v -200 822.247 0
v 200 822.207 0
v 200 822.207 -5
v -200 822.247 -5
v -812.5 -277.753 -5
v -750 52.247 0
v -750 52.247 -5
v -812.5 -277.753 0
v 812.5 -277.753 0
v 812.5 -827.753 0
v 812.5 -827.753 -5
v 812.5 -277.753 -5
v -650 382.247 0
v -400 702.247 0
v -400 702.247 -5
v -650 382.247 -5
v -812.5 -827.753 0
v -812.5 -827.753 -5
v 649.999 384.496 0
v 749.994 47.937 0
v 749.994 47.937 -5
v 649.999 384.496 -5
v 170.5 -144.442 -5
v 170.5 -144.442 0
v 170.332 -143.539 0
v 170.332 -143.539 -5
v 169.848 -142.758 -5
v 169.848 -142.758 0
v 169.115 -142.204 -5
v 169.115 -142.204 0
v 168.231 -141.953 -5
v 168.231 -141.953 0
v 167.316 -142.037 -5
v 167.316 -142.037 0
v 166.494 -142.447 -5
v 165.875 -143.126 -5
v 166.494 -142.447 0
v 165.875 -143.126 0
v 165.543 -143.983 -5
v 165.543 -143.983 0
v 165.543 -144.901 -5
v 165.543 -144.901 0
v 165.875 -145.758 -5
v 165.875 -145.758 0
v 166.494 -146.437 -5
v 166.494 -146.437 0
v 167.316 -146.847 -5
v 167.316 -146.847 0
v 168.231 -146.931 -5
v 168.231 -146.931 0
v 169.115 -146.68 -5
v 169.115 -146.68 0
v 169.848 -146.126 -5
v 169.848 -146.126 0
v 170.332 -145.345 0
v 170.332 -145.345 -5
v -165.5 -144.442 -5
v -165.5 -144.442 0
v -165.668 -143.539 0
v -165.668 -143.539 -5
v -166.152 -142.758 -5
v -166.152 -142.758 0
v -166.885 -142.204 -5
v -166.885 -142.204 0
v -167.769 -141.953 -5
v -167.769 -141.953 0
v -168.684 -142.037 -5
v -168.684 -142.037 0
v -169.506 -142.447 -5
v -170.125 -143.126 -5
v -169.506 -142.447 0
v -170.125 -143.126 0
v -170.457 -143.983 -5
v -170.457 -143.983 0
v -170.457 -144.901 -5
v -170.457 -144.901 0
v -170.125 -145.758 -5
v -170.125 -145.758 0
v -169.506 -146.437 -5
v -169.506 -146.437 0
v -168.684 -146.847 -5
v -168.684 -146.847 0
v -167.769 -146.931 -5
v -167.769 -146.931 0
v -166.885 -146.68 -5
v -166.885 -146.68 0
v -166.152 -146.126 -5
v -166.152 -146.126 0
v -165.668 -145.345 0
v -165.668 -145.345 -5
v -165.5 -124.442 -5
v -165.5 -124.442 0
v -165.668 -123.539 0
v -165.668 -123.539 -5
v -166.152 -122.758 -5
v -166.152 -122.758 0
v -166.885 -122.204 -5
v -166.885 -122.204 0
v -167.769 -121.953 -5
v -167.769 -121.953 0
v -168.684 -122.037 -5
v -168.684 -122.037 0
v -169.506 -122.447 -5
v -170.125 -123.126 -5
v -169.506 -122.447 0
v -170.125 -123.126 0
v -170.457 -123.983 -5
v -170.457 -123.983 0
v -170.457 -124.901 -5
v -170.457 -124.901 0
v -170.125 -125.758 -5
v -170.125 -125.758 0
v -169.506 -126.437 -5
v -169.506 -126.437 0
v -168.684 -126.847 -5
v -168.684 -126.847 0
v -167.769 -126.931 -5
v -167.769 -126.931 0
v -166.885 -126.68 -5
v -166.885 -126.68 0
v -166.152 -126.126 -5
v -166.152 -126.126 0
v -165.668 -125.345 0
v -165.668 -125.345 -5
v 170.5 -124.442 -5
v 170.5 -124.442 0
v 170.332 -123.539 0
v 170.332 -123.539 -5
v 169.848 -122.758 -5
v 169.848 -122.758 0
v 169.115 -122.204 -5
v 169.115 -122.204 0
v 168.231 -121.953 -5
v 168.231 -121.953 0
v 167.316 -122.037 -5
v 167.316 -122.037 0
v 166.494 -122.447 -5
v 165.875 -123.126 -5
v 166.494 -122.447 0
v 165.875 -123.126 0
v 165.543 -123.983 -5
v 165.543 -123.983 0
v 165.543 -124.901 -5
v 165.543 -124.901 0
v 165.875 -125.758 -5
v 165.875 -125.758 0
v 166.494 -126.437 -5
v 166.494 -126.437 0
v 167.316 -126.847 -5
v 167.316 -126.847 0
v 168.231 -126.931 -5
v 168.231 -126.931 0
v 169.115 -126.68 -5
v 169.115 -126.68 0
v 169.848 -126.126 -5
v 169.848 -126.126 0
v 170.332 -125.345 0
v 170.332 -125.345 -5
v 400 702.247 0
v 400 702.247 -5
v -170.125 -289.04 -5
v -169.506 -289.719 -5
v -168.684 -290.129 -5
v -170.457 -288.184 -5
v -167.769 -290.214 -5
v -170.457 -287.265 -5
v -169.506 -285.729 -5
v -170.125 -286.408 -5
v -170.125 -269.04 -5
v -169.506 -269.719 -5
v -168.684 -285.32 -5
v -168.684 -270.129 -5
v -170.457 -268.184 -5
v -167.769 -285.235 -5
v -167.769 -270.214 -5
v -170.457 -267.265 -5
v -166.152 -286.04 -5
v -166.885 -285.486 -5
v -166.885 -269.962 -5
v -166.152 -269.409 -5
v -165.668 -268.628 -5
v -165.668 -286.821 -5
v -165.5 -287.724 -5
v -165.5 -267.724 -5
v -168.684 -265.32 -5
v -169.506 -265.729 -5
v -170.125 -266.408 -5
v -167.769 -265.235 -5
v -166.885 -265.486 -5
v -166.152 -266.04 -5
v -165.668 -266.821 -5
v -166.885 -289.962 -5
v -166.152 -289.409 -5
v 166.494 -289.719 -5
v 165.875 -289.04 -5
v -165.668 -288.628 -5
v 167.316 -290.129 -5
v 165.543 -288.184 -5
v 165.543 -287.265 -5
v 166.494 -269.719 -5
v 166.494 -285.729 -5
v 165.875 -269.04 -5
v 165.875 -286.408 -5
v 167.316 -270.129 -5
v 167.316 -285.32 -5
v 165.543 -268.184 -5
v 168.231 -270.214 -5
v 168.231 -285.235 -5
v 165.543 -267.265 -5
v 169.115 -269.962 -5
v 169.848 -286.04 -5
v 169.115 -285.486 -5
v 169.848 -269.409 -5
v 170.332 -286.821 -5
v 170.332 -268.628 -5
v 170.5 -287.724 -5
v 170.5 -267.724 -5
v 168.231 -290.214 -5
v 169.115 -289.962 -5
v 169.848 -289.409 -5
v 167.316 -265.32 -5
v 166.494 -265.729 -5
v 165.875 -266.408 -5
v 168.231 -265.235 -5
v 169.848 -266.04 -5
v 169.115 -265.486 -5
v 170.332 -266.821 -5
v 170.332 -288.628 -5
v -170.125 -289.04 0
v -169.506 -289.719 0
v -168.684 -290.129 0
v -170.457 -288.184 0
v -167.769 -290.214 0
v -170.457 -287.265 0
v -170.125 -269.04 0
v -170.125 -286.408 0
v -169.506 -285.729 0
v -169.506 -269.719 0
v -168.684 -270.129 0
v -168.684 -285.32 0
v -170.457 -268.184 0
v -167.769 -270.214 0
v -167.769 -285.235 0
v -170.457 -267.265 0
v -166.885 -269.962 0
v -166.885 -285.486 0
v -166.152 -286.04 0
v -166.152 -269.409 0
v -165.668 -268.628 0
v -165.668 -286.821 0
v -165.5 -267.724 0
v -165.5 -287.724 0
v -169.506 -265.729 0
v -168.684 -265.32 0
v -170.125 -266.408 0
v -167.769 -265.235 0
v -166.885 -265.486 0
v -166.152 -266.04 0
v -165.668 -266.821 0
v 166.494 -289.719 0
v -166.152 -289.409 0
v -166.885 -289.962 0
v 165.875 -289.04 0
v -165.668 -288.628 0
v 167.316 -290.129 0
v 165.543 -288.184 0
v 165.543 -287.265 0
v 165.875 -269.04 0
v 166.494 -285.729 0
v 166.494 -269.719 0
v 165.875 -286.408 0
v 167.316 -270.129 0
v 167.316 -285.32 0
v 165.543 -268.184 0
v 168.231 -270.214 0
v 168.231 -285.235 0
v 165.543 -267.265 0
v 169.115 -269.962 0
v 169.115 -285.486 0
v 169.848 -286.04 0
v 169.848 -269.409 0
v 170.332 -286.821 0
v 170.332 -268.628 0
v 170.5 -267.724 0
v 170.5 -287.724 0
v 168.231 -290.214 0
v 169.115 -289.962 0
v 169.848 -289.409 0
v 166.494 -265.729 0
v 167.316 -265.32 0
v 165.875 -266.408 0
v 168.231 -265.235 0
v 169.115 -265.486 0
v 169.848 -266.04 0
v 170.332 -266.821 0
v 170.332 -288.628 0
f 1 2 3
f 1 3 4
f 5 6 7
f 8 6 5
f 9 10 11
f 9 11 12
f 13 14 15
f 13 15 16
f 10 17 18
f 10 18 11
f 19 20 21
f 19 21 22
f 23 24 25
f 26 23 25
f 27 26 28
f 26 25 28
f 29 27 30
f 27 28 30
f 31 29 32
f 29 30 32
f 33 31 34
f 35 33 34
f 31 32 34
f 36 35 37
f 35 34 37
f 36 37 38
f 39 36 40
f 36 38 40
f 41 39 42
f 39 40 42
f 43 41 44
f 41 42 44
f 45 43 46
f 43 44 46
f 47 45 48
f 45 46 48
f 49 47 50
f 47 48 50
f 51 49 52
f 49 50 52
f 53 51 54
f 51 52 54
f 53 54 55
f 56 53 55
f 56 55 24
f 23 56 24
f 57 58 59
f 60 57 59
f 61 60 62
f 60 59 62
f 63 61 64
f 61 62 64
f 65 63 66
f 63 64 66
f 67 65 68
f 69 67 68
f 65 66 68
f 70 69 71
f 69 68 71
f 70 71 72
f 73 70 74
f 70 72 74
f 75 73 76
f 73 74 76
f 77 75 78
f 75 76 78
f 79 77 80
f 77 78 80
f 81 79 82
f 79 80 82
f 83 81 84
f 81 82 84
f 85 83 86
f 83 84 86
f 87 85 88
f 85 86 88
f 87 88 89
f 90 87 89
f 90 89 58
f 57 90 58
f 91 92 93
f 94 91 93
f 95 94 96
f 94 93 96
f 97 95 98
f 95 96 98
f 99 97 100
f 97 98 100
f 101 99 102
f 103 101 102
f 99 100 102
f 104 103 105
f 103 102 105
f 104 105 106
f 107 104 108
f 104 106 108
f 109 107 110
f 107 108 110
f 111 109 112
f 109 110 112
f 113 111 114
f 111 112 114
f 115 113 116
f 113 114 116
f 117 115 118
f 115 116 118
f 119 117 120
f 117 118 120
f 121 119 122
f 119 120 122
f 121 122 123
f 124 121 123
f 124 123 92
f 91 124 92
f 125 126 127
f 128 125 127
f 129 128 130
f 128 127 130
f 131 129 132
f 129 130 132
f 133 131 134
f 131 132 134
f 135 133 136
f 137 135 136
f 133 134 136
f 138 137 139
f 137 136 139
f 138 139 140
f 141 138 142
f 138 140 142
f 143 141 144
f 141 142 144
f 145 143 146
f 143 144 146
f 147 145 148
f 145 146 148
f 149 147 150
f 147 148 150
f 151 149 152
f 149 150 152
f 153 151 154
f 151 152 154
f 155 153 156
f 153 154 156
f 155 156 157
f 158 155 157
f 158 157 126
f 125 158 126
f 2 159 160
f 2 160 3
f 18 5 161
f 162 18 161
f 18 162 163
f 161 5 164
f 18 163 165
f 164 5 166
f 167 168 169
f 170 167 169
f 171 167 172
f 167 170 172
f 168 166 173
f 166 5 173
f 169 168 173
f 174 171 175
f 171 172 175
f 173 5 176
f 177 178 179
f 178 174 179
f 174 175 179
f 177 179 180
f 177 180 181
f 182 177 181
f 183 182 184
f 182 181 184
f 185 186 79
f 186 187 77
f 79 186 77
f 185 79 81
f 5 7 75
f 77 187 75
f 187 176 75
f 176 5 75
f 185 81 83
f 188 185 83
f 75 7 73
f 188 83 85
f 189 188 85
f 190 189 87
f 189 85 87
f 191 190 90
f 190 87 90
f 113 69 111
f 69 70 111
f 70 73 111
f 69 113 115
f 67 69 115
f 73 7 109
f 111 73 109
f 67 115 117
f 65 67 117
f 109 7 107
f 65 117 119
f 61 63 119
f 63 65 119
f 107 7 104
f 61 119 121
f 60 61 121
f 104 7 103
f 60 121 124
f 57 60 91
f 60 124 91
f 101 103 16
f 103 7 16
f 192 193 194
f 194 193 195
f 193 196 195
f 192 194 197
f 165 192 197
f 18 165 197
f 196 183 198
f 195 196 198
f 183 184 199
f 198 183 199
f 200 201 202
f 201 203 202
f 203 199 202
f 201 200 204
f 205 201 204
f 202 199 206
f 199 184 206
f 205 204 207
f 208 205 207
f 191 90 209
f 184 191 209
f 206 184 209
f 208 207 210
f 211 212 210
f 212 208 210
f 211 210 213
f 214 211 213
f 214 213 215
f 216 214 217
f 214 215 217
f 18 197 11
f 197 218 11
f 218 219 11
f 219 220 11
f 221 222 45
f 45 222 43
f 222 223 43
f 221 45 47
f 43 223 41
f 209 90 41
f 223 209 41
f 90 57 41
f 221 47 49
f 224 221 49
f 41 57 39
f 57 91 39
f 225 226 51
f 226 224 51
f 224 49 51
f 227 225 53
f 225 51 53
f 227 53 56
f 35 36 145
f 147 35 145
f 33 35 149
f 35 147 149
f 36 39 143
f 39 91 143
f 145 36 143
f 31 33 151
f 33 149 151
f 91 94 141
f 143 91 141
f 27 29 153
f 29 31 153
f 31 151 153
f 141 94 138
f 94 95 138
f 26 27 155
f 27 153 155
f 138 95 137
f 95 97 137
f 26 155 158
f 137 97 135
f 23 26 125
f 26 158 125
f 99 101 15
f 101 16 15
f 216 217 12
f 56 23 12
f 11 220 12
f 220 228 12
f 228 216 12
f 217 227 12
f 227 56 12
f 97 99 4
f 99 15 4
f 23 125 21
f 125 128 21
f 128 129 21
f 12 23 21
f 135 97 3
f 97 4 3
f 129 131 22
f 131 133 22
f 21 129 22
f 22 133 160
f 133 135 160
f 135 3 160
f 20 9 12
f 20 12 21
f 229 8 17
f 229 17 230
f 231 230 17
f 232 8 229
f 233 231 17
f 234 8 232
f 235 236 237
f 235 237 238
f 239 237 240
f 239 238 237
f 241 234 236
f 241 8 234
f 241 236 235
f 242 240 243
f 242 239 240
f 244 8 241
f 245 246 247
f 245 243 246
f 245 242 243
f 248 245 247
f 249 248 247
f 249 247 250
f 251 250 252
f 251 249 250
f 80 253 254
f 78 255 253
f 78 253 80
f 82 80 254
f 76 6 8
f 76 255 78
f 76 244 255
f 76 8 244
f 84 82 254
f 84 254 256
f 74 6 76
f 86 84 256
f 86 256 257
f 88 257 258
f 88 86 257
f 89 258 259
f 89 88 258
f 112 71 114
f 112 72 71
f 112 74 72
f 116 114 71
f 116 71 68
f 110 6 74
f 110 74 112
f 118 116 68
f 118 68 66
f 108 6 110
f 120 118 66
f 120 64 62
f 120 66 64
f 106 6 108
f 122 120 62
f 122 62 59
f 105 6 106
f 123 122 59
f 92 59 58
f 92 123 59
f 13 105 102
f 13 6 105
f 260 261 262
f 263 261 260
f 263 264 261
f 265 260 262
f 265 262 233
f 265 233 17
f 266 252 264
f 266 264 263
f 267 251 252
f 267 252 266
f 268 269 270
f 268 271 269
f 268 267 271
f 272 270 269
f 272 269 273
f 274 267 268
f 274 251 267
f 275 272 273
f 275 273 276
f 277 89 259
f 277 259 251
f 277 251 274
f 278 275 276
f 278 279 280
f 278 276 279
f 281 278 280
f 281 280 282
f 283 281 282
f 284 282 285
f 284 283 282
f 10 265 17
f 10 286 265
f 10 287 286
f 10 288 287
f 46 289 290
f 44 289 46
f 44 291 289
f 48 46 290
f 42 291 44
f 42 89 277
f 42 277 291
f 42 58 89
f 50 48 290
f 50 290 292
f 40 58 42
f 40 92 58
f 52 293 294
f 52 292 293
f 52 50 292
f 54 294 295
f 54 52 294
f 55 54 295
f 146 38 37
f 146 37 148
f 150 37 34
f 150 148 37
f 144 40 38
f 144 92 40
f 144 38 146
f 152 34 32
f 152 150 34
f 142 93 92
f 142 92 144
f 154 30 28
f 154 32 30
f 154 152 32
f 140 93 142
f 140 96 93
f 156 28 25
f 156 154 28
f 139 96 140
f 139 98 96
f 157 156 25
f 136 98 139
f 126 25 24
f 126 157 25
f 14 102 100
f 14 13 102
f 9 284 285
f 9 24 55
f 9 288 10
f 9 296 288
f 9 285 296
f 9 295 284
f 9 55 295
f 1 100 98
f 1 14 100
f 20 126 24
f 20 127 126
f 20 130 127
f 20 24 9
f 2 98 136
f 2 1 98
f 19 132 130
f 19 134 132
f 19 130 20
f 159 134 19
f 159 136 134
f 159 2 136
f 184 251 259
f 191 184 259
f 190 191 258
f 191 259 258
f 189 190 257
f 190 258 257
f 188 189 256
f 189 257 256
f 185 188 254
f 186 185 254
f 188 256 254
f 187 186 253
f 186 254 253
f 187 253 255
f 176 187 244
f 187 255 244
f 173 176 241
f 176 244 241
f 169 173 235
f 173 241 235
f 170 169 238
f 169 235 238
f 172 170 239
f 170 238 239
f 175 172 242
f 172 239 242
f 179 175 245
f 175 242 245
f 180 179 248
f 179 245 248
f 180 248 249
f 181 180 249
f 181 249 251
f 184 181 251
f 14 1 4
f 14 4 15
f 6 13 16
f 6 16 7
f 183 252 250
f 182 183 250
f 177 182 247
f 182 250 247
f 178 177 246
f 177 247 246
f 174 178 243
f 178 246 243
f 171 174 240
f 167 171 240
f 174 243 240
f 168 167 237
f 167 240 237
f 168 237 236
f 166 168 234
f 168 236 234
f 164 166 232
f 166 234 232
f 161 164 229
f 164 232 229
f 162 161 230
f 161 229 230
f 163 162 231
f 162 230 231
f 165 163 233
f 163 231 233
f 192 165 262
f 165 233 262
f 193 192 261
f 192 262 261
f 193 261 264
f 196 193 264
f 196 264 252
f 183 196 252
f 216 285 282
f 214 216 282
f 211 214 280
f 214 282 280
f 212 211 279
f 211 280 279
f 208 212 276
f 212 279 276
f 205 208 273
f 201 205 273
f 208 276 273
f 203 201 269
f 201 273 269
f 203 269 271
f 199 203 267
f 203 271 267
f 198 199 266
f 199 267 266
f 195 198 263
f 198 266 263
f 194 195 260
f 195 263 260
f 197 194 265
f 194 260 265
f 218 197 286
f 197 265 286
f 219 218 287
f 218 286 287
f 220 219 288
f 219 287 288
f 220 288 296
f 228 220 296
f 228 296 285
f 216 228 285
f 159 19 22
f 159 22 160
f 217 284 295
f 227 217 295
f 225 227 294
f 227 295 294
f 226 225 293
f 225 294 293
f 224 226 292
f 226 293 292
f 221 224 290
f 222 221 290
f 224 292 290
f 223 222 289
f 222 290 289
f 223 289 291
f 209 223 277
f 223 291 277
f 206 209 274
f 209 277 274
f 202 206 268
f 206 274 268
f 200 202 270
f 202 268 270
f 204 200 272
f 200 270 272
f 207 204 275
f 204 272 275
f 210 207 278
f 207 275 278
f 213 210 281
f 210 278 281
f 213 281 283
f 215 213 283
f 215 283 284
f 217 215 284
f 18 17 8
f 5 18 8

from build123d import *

# Parameters (mm, degrees)
F0_R     = 2.5
F0_W     = 1625
F0_H     = 550
F1_DEPTH = 5


with BuildPart() as f1:
    # F0 (on Top) → F1 (new body)
    with BuildSketch(Plane.XY):
        Polygon((-749.999512, 52.24733), (-812.499512, -277.75267), (812.500488, -277.75267), (749.994295, 47.936948), align=None)
        with Locations((-167.999512, -267.7244)):
            Circle(F0_R, mode=Mode.SUBTRACT)
        with Locations((-167.999512, -144.441955)):
            Circle(F0_R, mode=Mode.SUBTRACT)
        with Locations((-167.999512, -124.441955)):
            Circle(F0_R, mode=Mode.SUBTRACT)
        with Locations((168.000488, -267.7244)):
            Circle(F0_R, mode=Mode.SUBTRACT)
        with Locations((168.000488, -144.441955)):
            Circle(F0_R, mode=Mode.SUBTRACT)
        with Locations((168.000488, -124.441955)):
            Circle(F0_R, mode=Mode.SUBTRACT)
        with Locations((0.000488, -552.75267)):
            Rectangle(F0_W, F0_H)
        with Locations((-167.999512, -287.7244)):
            Circle(F0_R, mode=Mode.SUBTRACT)
        with Locations((168.000488, -287.7244)):
            Circle(F0_R, mode=Mode.SUBTRACT)
        Polygon((-649.999512, 382.24733), (-749.999512, 52.24733), (749.994295, 47.936948), (649.998543, 384.496444), align=None)
        Polygon((-399.999512, 702.24733), (-649.999512, 382.24733), (649.998543, 384.496444), (400.000488, 702.24733), align=None)
        Polygon((-199.999512, 822.24733), (-399.999512, 702.24733), (400.000488, 702.24733), (200.000486, 822.207413), align=None)
    extrude(amount=-F1_DEPTH)


solid = f1.part
